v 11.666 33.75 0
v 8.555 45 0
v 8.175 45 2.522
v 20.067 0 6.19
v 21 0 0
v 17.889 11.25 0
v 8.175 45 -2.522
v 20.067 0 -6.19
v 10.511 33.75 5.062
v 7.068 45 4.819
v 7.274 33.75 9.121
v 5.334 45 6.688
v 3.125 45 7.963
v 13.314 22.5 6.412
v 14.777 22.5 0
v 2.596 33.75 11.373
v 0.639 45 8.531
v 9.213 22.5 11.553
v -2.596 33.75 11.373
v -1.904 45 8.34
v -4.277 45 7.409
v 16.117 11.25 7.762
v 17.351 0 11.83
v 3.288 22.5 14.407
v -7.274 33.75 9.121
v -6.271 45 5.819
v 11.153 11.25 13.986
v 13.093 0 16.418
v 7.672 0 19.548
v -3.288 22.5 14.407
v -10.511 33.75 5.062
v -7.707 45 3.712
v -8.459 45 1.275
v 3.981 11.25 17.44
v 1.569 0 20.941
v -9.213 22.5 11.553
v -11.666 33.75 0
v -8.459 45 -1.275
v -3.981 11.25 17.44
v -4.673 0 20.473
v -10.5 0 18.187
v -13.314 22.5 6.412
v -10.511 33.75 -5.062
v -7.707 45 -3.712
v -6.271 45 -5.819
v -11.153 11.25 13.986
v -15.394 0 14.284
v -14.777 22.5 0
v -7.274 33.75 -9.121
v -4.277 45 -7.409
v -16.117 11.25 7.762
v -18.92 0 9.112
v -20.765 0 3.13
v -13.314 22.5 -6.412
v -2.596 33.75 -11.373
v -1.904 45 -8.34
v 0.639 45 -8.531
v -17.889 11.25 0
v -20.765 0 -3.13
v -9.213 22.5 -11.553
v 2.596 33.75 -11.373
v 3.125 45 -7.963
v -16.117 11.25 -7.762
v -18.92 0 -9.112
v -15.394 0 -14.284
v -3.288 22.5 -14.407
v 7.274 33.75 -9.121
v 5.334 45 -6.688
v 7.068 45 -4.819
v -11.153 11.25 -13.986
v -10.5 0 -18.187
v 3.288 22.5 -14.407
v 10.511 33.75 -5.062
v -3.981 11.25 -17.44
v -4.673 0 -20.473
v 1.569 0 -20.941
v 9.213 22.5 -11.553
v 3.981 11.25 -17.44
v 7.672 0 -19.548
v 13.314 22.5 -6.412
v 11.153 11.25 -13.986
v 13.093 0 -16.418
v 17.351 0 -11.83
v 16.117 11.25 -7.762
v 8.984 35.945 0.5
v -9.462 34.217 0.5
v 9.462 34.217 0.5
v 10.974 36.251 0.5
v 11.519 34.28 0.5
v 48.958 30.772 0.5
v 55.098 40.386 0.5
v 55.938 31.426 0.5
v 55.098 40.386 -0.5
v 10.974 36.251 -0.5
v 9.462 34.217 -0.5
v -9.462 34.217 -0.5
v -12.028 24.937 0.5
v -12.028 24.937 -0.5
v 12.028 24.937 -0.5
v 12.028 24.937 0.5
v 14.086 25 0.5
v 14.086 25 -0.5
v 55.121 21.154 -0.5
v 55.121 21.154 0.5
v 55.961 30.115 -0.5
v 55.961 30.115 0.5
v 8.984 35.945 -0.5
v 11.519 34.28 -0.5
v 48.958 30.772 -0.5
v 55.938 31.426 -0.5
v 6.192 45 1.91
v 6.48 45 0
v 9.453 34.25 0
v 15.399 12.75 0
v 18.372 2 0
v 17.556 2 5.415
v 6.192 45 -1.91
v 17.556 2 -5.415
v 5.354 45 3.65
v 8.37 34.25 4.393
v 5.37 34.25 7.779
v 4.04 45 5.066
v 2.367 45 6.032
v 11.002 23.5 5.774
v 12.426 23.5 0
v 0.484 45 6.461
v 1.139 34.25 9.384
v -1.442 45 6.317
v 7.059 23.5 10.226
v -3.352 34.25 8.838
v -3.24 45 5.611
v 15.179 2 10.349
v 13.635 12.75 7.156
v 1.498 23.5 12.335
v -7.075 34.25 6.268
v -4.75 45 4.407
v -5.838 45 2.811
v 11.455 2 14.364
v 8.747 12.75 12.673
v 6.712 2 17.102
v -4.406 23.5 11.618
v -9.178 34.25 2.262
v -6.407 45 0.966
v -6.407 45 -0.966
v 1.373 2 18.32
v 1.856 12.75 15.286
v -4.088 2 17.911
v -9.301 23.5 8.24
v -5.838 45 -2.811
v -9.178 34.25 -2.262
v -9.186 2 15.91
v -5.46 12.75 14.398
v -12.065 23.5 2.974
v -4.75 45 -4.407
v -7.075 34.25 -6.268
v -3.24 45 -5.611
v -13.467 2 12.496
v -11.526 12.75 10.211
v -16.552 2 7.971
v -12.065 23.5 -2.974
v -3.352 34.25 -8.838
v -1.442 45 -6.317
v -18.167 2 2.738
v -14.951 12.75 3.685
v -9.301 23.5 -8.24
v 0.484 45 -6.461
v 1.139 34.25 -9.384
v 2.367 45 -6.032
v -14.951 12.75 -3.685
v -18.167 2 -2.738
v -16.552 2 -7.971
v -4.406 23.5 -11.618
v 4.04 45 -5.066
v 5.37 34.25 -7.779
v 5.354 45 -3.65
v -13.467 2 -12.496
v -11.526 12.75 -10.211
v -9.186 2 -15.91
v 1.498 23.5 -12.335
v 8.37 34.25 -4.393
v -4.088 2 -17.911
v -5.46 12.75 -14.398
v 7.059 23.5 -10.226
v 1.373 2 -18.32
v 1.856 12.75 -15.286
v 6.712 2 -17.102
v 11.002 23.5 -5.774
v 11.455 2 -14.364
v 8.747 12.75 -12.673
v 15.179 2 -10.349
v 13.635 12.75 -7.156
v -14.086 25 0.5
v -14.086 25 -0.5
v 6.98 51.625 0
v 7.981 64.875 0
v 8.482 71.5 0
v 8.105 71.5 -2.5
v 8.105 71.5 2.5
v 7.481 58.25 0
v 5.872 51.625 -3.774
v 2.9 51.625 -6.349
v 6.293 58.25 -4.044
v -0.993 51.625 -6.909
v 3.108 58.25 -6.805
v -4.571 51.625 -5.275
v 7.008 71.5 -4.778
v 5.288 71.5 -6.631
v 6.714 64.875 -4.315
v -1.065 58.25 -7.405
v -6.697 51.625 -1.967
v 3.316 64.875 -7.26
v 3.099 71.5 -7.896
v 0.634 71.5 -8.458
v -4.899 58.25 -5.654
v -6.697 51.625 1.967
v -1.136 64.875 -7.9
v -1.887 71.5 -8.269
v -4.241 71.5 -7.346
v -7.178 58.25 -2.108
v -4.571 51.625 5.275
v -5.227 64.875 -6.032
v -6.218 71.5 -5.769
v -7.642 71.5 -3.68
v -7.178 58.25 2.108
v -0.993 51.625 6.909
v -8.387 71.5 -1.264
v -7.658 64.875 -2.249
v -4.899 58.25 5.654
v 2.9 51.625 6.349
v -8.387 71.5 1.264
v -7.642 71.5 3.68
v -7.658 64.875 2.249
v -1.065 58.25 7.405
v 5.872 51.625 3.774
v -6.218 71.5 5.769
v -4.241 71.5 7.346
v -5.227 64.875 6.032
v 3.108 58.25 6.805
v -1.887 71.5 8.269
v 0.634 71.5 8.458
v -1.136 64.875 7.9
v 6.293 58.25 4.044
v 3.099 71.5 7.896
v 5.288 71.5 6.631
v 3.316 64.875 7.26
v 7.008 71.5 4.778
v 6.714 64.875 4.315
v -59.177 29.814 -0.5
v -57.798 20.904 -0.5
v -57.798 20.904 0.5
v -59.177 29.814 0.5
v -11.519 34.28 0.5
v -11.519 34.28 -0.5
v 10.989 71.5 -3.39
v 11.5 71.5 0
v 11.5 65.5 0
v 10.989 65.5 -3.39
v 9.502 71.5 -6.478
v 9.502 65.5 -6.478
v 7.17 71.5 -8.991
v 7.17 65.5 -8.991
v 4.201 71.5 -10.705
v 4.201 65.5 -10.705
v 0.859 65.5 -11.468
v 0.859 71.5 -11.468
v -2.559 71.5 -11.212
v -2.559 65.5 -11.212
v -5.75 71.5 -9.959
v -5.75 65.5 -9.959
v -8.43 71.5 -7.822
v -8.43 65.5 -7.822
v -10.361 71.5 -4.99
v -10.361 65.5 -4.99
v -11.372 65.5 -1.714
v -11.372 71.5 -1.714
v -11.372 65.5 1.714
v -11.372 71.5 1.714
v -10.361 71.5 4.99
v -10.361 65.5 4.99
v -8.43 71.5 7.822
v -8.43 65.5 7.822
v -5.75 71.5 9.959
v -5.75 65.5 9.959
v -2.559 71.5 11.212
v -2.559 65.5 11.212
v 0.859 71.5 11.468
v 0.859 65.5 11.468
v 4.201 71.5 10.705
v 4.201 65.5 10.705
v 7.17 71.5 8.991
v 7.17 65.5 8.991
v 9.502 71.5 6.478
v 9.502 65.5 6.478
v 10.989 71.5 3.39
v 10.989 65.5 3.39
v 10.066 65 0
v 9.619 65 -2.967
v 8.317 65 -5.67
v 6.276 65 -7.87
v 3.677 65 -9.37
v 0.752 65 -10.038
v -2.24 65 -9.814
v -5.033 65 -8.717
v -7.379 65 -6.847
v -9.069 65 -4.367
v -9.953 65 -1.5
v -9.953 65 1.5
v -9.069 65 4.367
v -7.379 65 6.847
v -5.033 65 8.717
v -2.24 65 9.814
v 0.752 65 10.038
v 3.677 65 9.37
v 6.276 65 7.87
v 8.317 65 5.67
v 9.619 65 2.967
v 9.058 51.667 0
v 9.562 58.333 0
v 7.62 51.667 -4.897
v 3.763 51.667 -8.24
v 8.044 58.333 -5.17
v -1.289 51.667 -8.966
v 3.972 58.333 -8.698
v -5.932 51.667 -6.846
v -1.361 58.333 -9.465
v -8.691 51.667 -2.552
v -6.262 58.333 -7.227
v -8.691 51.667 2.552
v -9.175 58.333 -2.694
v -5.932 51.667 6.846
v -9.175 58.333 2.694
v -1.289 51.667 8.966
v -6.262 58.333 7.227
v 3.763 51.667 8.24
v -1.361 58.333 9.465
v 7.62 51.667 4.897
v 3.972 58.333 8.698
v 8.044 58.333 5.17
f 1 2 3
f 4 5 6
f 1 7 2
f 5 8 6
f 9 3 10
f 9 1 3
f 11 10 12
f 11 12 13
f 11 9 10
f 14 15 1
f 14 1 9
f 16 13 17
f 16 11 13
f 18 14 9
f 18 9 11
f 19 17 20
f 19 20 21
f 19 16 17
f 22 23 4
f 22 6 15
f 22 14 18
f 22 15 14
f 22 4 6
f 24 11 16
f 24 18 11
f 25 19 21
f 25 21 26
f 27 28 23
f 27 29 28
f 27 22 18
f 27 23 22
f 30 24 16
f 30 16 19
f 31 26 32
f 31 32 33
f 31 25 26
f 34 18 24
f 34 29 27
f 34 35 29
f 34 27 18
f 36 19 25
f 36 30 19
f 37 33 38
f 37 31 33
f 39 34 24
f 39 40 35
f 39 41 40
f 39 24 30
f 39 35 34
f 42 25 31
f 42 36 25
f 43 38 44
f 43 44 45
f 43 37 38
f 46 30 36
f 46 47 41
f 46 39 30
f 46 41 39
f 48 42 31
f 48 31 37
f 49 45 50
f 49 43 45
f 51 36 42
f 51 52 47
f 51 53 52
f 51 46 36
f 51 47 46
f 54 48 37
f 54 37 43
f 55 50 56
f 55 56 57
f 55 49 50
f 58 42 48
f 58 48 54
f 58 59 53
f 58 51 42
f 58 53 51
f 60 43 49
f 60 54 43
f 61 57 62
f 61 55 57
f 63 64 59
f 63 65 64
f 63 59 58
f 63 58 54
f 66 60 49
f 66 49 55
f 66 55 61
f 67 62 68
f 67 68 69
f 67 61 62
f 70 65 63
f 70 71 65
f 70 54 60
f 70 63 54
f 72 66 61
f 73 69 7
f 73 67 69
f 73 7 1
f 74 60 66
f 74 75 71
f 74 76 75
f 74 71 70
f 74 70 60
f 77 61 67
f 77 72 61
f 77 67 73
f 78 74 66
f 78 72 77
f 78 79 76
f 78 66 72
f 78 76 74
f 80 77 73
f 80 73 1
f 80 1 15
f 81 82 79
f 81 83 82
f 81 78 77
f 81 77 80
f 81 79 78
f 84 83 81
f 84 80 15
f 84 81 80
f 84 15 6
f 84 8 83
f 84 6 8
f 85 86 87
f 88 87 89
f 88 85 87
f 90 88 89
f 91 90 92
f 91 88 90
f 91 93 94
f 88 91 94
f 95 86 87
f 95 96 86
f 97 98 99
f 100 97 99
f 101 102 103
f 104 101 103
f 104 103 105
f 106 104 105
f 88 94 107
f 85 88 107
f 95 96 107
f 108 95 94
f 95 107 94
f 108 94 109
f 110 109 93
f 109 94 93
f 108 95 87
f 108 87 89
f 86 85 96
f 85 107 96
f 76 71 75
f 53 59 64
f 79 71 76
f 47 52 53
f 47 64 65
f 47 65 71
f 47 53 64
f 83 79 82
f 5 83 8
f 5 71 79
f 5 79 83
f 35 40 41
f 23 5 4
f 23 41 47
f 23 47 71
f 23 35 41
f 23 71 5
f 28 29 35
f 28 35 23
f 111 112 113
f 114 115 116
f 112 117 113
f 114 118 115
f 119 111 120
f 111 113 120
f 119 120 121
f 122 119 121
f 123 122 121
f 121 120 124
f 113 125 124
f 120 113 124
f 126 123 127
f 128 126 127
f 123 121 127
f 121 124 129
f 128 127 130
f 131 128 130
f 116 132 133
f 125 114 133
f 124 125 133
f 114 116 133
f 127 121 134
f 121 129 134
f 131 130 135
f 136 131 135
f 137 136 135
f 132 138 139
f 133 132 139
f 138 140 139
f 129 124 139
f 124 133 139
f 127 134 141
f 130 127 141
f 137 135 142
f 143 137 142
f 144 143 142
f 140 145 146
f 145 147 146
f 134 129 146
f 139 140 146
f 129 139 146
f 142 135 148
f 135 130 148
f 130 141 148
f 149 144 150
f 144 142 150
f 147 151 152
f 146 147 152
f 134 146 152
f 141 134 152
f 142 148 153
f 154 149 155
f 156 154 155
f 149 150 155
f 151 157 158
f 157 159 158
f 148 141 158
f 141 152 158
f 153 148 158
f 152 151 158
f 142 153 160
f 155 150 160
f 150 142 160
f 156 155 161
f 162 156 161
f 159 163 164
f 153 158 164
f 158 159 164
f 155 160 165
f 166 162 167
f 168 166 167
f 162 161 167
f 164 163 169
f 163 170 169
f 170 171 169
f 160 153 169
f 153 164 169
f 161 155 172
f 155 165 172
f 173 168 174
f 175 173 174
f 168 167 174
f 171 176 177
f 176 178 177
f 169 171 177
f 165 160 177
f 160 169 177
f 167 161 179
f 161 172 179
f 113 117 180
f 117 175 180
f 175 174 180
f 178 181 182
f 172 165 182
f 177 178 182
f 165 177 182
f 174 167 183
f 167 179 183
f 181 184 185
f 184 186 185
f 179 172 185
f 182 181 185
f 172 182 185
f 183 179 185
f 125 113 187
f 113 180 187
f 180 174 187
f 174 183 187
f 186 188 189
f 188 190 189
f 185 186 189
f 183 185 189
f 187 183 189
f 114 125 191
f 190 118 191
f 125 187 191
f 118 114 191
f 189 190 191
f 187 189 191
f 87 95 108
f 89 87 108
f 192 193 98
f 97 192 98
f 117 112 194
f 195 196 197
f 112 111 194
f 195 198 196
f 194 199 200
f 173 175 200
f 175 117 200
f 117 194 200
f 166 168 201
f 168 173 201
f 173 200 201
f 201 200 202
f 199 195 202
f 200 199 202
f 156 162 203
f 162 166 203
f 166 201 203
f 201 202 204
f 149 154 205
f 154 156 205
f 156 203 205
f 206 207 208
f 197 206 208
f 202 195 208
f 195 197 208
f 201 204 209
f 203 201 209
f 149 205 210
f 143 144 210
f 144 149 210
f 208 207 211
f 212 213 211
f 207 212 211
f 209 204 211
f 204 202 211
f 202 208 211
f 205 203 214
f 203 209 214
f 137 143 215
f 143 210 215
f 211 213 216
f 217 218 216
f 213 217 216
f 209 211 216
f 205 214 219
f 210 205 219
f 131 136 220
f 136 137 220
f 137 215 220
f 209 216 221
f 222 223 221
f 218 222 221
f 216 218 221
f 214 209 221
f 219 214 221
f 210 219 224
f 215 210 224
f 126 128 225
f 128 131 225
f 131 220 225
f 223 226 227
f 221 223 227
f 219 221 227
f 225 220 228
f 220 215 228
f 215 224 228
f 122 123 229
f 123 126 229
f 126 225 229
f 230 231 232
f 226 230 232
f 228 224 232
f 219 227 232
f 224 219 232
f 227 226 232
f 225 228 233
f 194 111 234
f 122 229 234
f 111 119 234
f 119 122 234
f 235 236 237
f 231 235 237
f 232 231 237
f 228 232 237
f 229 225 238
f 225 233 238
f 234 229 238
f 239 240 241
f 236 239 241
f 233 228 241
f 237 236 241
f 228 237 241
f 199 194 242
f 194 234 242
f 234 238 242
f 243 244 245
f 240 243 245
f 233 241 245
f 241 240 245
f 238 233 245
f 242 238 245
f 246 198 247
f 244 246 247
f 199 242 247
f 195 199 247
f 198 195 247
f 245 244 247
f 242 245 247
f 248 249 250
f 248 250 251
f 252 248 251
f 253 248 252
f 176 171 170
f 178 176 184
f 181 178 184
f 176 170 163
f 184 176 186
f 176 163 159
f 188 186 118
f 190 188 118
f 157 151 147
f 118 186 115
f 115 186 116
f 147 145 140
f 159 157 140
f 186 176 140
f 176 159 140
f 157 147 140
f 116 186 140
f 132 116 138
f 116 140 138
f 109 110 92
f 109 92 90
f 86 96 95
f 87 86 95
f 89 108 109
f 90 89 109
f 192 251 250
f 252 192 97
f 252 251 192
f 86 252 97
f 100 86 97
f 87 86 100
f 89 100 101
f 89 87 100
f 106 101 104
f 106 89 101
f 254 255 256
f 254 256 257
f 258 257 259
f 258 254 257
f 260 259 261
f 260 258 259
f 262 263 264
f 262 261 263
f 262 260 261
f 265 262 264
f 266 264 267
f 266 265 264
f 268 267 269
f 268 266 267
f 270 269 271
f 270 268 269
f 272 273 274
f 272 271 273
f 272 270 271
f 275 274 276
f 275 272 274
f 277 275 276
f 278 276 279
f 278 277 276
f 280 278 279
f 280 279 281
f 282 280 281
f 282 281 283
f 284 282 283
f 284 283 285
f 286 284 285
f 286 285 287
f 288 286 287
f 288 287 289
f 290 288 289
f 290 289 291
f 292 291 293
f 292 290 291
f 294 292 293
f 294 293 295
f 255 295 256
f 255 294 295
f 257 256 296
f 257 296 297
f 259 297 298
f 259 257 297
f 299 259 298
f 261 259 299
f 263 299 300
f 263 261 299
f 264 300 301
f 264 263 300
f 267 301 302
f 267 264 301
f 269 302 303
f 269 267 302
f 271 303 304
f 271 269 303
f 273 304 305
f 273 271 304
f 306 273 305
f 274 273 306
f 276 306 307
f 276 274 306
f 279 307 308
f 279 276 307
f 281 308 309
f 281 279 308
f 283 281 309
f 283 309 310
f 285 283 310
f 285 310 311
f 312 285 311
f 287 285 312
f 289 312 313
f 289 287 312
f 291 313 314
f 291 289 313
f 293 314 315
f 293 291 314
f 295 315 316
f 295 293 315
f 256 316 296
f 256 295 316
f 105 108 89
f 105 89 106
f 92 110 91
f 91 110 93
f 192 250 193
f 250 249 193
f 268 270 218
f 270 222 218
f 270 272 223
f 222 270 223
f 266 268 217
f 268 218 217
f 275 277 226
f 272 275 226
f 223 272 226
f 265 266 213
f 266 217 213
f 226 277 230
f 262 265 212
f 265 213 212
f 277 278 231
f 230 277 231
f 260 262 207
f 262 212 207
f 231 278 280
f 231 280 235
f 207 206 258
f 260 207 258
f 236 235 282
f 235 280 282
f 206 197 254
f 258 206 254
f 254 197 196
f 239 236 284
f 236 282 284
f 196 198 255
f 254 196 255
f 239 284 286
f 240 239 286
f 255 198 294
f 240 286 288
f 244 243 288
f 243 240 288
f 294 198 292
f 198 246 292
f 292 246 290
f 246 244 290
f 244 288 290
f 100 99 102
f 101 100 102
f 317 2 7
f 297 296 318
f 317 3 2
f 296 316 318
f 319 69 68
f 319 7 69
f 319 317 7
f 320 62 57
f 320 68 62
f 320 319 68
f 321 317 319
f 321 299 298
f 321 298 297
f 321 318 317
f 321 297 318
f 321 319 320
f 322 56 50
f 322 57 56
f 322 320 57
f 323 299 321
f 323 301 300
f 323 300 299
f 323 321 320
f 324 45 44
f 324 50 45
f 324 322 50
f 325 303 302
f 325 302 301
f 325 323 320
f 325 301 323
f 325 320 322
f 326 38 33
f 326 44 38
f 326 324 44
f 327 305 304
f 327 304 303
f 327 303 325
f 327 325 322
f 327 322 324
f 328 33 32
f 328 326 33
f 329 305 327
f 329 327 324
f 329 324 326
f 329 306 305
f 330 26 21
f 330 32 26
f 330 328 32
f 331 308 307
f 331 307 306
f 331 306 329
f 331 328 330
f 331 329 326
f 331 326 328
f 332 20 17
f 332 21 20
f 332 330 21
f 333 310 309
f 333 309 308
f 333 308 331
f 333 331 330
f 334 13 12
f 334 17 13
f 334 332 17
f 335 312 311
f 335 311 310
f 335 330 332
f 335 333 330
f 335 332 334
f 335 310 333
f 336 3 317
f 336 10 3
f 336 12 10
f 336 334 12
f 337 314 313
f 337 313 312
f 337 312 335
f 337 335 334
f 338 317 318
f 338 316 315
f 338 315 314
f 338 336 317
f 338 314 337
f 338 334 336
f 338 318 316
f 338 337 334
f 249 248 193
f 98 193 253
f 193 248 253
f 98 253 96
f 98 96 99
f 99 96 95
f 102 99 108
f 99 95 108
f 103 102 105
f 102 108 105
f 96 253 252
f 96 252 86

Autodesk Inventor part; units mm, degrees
ref_plane "YZ Plane" through (0, 0, 0) normal (1, 0, 0) x (0, 1, 0)
ref_plane "XZ Plane" through (0, 0, 0) normal (0, 1, 0) x (-1, 0, 0)
ref_plane "XY Plane" through (0, 0, 0) normal (0, 0, 1) x (1, 0, 0)
sketch "Эскиз1" plane through (0, 0, 0) normal (0, 0, 1) x (1, 0, 0)
  line L0 (-59.1772, 29.8139) -> (-11.5194, 34.2799)
  line L1 (-11.5194, 34.2799) -> (-9.4617, 34.2168)
  line L2 (-9.4617, 34.2168) -> (9.4617, 34.2168)
  line L3 (4.1486, 29.9467) -> (-11.5194, 34.2799) construction
  line L4 (5.2614, 30.1449) -> (-9.4617, 34.2168) construction
  line L5 (-8.6873, 29.1974) -> (9.4617, 34.2168) construction
  line L6 (9.4617, 34.2168) -> (11.5194, 34.2799)
  line L7 (11.5194, 34.2799) -> (55.9611, 30.1153)
  line L8 (11.5194, 34.2799) -> (-7.5026, 29.0191) construction
  line L9 (-57.7983, 20.9036) -> (-14.0859, 25)
  line L10 (-14.0859, 25) -> (-12.0283, 24.9369)
  line L11 (-12.0283, 24.9369) -> (12.0283, 24.9369)
  line L12 (12.0283, 24.9369) -> (14.0859, 25)
  line L13 (14.0859, 25) -> (55.1213, 21.1545)
  line L14 (1.508, 20.6873) -> (-14.0859, 25) construction
  line L15 (2.624, 20.8846) -> (-12.0283, 24.9369) construction
  line L16 (-5.9804, 19.9563) -> (12.0283, 24.9369) construction
  line L17 (-4.7984, 19.7773) -> (14.0859, 25) construction
  line L18 (0, 0) -> (21, 0)
  line L19 (21, 0) -> (8.5546, 45)
  line L20 (8.5546, 45) -> (10.0659, 65)
  line L21 (11.5, 65.5) -> (11.5, 71.5)
  line L22 (11.5, 71.5) -> (8.482, 71.5)
  line L23 (8.482, 71.5) -> (6.4795, 45)
  line L24 (6.4795, 45) -> (18.3718, 2)
  line L25 (18.3718, 2) -> (0, 2)
  line L26 (0, -7.6494) -> (0, -31.8354)
  line L27 (10.0659, 65) -> (11.5, 65.5)
  line L28 (0, 0) -> (-21, 0)
  line L29 (-21, 0) -> (-8.5546, 45)
  line L30 (-8.5546, 45) -> (-10.0659, 65)
  line L31 (-11.5, 65.5) -> (-11.5, 71.5)
  line L32 (-11.5, 71.5) -> (-8.482, 71.5)
  line L33 (-8.482, 71.5) -> (-6.4795, 45)
  line L34 (-6.4795, 45) -> (-18.3718, 2)
  line L35 (-18.3718, 2) -> (0, 2)
  line L36 (-10.0659, 65) -> (-11.5, 65.5)
  line L37 (55.0978, 40.3863) -> (10.9741, 36.2514)
  line L38 (55.9376, 31.4256) -> (13.411, 27.4404)
  line L39 (10.9741, 36.2514) -> (8.9837, 35.9454)
  line L40 (13.411, 27.4404) -> (11.4205, 27.1343)
  line L41 (11.4205, 27.1343) -> (-12.0283, 24.9369)
  line L42 (8.9837, 35.9454) -> (-9.4617, 34.2168)
  line L43 (55.9376, 31.4256) -> (55.0978, 40.3863)
  line L44 (55.1213, 21.1545) -> (55.9611, 30.1153)
  line L45 (-57.7983, 20.9036) -> (-59.1772, 29.8139)
  line L46 (0, 2) -> (0, 0)
  point P0 (48.958, 30.7715)
  dimension "Fall11" = 20.813
  dimension "d2" = 13.703
  dimension "Fall12" = 13.703
  dimension "d6" = 15.46
  dimension "Fall13" = 15.46
  dimension "d8" = 13.703
  dimension "Fall14" = 13.703
  dimension "d10" = 20.813
  dimension "Fall21" = 20.813
  dimension "d12" = 13.703
  dimension "Fall22" = 13.703
  dimension "d14" = 15.46
  dimension "Fall23" = 15.46
  dimension "d16" = 13.703
  dimension "Fall24" = 13.703
  dimension "d18" = 20.813
  dimension "d24" = 9
  dimension "d25" = 360
  dimension "d26" = 9.6283
  dimension "d27" = 2
  dimension "d28" = 2
  dimension "d29" = 21
  dimension "d30" = 12.959
  dimension "d31" = 16.964
  dimension "d32" = 11.5
  dimension "d33" = 0.5
  dimension "d34" = 6
  dimension "d35" = 20
  dimension "d36" = 45
  dimension "d37" = 25
  dimension "d38" = 69.187
revolve "Вращение1" add sketch "Эскиз1" angle 360 about axis through (0, -7.6494, 0) along (0, -1, 0) contours L24 L39 L19 L6 | L6 L19 L40 L24 | L24 L23 L22 L21 L27 L20 L19 L39 | L40 L19 L12 L24 | L12 L19 L18 L46 L25 L24
extrude "Выдавливание1" add sketch "Эскиз1" along normal mid plane 1 separate body contours L0 L29 L9 L45 | L1 L34 L10 L29 | L2 L24 L41 L34 | L6 L19 L40 L24 | L41 L24 L11 | L7 L38 L19 | L40 L19 L12 L24 | L7 L44 L13 L19 L38
extrude "Выдавливание2" add sketch "Эскиз1" along normal mid plane 1 separate body contours L42 L24 L2 | L24 L39 L19 L6 | L19 L37 L43 L38 L7
equation "\"n2\" = 1.5"
equation "\"n3\" = 1.333"
properties part number "Симуляция преломления в конической колбе в зависимости от высоты"
